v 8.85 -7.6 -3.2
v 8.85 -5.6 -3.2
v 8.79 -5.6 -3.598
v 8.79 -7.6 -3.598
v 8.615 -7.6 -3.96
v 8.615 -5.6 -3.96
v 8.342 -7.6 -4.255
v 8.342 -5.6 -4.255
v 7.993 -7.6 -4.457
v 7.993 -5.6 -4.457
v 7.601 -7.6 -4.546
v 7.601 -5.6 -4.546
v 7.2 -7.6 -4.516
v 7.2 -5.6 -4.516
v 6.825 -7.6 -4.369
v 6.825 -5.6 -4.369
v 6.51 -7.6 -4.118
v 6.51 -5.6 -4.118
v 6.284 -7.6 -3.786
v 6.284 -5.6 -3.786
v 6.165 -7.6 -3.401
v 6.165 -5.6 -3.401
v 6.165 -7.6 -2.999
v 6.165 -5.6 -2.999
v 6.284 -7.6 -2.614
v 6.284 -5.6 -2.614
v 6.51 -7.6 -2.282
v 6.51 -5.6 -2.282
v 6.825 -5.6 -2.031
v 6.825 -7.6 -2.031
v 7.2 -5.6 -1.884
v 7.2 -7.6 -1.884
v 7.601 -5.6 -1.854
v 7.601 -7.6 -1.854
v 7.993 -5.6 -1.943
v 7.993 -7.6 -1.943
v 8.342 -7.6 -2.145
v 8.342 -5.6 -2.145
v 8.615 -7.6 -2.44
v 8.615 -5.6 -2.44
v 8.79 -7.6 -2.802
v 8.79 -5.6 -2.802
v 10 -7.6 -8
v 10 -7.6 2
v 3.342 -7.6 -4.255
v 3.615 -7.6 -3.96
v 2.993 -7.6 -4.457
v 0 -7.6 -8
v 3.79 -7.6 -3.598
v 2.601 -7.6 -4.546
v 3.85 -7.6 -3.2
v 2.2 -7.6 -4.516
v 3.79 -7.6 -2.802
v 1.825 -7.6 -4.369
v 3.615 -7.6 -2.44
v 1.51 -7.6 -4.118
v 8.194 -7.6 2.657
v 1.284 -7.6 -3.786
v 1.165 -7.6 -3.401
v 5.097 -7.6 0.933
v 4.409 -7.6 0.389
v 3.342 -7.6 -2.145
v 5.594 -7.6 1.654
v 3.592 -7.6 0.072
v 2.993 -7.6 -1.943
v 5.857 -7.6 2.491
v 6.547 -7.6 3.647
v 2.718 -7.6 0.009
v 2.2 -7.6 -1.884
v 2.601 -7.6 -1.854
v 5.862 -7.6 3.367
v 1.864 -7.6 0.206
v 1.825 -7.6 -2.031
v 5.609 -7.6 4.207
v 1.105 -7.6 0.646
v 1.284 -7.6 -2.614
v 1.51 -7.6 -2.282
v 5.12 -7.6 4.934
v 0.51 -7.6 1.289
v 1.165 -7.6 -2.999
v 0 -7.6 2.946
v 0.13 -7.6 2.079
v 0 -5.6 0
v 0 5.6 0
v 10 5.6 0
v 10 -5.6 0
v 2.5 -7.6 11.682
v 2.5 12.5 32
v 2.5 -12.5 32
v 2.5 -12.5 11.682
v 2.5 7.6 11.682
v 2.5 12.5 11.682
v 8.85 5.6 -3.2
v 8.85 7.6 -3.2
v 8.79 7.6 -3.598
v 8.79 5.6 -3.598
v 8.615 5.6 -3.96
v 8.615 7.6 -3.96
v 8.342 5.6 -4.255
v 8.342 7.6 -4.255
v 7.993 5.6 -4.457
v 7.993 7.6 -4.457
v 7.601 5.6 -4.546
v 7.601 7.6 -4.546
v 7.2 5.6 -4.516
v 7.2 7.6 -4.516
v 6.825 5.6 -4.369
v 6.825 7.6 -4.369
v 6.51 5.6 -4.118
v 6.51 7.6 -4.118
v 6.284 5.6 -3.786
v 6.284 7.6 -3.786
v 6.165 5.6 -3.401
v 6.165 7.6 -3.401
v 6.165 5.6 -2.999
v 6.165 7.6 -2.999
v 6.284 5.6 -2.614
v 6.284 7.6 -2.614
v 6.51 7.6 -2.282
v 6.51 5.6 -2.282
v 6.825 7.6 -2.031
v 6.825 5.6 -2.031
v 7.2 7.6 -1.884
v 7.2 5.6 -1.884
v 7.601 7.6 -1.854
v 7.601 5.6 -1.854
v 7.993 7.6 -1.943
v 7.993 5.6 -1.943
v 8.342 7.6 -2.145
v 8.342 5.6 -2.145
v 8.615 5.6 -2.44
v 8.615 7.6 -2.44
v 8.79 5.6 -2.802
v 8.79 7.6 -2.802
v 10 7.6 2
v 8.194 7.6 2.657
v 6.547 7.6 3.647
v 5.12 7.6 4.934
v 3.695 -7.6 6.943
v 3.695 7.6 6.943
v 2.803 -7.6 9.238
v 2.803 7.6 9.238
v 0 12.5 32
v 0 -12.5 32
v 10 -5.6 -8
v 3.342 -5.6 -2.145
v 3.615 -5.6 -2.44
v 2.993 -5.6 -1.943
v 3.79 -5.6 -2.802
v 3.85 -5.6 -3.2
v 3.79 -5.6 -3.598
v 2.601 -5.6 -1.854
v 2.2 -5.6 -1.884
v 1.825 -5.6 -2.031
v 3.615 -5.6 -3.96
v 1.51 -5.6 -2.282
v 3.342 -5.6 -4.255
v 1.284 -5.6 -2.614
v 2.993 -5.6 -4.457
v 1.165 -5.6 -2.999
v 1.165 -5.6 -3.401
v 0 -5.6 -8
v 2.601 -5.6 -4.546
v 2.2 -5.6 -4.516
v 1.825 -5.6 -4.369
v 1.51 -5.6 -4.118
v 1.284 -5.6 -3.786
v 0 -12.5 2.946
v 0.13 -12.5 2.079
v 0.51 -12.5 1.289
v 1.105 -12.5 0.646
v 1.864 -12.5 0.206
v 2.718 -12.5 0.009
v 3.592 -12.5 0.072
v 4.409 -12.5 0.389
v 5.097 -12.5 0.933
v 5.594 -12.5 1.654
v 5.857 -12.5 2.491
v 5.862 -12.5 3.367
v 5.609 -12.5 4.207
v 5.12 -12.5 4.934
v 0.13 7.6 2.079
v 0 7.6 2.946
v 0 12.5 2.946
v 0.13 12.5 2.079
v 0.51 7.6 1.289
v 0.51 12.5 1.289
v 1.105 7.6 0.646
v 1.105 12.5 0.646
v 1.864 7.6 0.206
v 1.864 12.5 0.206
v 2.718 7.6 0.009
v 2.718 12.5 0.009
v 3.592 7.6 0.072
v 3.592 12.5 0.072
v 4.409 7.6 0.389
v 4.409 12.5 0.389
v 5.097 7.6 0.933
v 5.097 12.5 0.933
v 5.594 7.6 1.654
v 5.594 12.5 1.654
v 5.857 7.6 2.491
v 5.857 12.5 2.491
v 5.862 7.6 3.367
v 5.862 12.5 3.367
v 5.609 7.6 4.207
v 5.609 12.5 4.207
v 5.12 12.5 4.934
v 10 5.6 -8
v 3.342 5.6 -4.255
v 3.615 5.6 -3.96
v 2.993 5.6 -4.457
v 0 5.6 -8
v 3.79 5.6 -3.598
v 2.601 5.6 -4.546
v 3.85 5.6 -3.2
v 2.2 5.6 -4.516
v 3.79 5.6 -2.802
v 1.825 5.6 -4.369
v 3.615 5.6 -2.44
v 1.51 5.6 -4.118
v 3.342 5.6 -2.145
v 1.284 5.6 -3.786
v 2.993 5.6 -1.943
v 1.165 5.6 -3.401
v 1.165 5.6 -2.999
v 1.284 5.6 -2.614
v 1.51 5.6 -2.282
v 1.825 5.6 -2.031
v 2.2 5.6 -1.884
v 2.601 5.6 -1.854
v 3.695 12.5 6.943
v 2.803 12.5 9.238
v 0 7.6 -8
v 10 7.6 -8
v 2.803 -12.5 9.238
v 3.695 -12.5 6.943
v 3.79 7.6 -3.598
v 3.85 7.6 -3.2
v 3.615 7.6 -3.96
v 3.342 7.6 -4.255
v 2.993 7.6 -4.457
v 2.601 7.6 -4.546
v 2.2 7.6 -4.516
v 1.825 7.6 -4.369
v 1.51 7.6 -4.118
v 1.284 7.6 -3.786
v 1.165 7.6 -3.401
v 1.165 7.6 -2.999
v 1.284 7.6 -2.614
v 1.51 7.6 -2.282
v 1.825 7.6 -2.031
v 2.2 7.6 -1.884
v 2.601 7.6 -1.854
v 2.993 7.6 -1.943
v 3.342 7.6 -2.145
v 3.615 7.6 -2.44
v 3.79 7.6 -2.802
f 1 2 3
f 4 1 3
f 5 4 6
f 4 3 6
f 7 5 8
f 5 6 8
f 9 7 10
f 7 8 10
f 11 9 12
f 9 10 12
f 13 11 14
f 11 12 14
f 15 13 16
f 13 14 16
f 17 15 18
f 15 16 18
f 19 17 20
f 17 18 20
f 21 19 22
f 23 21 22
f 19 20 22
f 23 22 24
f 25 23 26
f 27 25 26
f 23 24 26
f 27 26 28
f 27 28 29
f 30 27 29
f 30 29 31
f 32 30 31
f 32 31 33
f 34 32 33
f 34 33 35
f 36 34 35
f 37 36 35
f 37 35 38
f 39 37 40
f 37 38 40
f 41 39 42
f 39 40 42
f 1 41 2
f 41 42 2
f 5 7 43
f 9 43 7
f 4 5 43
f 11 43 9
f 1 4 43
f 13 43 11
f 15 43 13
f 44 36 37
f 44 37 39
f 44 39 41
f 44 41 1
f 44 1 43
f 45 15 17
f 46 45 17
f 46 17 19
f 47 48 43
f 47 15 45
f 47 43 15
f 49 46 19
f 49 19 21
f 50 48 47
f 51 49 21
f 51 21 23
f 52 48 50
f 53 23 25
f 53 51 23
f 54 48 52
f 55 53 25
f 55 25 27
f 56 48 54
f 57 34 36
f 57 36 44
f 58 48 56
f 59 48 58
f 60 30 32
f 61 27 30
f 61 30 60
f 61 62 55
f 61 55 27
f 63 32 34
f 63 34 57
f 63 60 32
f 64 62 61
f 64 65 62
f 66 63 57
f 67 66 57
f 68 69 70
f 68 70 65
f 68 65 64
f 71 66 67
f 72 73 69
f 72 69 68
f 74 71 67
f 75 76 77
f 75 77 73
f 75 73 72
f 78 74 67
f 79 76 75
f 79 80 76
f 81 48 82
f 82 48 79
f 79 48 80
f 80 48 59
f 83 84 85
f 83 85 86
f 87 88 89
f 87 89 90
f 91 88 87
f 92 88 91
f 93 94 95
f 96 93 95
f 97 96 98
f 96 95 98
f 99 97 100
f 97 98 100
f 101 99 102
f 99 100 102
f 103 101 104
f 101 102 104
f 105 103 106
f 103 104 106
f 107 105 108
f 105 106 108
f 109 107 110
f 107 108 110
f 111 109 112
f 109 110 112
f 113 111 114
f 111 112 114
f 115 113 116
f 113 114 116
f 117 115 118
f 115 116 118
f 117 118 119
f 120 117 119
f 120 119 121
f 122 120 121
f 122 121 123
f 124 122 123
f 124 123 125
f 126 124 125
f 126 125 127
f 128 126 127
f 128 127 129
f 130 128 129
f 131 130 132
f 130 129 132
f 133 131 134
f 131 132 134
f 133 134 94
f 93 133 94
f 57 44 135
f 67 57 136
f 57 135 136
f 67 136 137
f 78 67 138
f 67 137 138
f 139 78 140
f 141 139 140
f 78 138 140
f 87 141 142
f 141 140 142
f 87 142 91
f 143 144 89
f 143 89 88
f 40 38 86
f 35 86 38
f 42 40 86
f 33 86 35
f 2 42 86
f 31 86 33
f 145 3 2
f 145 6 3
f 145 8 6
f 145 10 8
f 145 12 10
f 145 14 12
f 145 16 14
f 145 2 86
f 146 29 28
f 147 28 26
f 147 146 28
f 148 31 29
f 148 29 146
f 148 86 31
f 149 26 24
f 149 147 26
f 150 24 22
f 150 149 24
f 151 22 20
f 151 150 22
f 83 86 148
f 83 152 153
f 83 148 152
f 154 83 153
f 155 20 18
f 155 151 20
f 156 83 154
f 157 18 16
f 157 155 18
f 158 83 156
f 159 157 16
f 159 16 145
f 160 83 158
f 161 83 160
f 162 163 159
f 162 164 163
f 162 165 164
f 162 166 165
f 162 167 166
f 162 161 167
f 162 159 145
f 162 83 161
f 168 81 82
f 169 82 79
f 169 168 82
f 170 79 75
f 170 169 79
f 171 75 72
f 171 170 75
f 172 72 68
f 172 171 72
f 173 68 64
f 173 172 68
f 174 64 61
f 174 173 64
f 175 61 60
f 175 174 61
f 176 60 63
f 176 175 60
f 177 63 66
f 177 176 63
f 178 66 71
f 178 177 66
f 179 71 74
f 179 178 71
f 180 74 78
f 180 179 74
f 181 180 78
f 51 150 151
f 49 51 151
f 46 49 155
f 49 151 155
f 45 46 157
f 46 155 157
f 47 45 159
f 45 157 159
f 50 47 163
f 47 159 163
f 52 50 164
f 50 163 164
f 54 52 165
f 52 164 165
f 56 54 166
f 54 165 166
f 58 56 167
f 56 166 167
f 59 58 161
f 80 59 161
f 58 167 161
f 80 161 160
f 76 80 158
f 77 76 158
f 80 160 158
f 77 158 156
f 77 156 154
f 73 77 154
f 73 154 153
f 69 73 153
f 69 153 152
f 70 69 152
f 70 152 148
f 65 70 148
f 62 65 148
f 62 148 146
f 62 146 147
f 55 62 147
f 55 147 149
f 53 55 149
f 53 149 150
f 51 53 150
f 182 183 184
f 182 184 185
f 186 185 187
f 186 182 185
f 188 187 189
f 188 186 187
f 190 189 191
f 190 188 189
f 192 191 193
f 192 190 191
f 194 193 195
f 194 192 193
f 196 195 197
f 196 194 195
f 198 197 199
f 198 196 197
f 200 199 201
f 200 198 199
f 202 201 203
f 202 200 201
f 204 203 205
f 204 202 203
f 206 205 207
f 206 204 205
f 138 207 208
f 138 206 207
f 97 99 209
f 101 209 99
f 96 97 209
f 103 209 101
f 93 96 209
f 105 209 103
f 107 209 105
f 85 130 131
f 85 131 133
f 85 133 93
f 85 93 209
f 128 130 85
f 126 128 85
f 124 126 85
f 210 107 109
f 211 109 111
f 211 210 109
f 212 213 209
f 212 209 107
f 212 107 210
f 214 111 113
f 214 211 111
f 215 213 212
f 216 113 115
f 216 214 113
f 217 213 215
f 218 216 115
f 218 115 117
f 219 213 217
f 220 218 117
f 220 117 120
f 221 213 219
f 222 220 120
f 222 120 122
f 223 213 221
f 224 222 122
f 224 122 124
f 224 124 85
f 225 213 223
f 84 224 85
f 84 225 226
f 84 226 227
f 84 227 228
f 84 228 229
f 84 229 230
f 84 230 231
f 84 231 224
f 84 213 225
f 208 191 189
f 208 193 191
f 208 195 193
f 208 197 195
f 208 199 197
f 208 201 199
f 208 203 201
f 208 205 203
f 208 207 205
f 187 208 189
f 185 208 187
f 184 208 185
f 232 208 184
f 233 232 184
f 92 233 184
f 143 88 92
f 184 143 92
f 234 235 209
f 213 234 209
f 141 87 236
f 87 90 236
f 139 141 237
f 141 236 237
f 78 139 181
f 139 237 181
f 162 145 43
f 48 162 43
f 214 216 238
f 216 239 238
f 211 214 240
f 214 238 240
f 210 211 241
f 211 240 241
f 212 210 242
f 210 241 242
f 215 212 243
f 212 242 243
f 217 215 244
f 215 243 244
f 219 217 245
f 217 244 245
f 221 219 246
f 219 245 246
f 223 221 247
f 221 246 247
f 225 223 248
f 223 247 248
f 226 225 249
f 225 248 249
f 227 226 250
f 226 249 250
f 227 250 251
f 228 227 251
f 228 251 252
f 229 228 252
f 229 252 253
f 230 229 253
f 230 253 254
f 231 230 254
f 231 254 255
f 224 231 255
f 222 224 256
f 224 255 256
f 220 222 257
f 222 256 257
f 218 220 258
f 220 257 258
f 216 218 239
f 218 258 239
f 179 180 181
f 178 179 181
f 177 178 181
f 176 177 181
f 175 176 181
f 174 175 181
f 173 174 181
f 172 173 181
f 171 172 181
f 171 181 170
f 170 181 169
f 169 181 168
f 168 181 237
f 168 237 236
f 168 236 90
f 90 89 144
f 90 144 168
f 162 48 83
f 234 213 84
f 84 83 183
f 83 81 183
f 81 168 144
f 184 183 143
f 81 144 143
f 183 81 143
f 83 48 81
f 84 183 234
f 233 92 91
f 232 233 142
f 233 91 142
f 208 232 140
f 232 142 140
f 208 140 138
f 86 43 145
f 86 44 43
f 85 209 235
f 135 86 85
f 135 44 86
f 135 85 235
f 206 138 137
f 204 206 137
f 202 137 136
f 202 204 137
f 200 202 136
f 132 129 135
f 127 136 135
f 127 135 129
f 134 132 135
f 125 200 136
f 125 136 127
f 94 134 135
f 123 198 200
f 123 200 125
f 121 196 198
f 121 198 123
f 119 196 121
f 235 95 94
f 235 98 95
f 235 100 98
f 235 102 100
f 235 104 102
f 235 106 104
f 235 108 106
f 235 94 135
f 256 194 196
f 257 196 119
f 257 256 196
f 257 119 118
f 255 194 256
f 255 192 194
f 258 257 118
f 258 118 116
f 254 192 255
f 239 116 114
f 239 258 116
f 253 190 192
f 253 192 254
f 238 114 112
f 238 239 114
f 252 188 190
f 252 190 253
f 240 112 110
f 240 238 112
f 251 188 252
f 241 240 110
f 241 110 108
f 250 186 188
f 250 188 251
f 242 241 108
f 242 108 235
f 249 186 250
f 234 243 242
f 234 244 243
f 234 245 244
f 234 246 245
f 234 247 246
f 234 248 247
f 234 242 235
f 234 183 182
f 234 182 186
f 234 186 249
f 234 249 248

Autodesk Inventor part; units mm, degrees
ref_plane "YZ Plane" through (0, 0, 0) normal (1, 0, 0) x (0, 1, 0)
ref_plane "XZ Plane" through (0, 0, 0) normal (0, 1, 0) x (-1, 0, 0)
ref_plane "XY Plane" through (0, 0, 0) normal (0, 0, 1) x (1, 0, 0)
sketch "スケッチ1" plane through (0, 0, 0) normal (1, 0, 0) x (0, 1, 0)
  line L0 (5.6, 0) -> (-5.6, 0)
  line L1 (-5.6, 0) -> (-5.6, -8)
  line L2 (-5.6, -8) -> (5.6, -8)
  line L3 (5.6, -8) -> (5.6, 0)
  line L4 (7.6, -8) -> (-7.6, -8)
  line L5 (-7.6, -8) -> (-7.6, 32)
  line L6 (-7.6, 32) -> (7.6, 32)
  line L7 (7.6, 32) -> (7.6, -8)
  point P0 (0, 0)
  point P1 (0, -8)
  dimension "d0" = 11.2
  dimension "d1" = 8
  dimension "d2" = 15.2
  dimension "d3" = 40
extrude "押し出し1" add sketch "スケッチ1" along normal blind 10 contours L0 L1 L4 L5 L6 L7 L3
sketch "スケッチ2" plane through (0, 7.6, 32) normal (0, 1, 0) x (1, 0, 0)
  circle A0 centre (2.5, 35.2) radius 1.35
  circle A1 centre (7.5, 35.2) radius 1.35
  line L0 (0, 40) -> (0, 0) projected
  line L1 (10, 40) -> (10, 0) projected
  line L2 (0, 32) -> (10, 32) projected
  dimension "d6" = 2.7
  dimension "d7" = 2.7
  dimension "d8" = 2.5
  dimension "d9" = 2.5
  dimension "d10" = 3.2
extrude "押し出し2" cut sketch "スケッチ2" against normal through all
sketch "スケッチ3" plane through (0, 7.6, 32) normal (0, 1, 0) x (1, 0, 0)
  line L0 (10, 0) -> (2.5, 0)
  line L1 (2.5, 0) -> (2.5, 30)
  line L2 (2.5, 30) -> (10, 30)
  line L3 (10, 30) -> (10, 0)
  line L4 (0, 40) -> (0, 0) projected
  point P0 (0, 32)
  dimension "d13" = 2.5
  dimension "d14" = 30
extrude "押し出し3" cut sketch "スケッチ3" against normal through all
fillet "フィレット1" radius 10 1 edges at (2.5, 0, 2)
sketch "スケッチ4" plane through (0, 0, 0) normal (0, 1, 0) x (-1, 0, 0)
  line L0 (0, -8) -> (-10, -8) projected
  line L1 (0, -8) -> (0, 32) projected
  line L2 (0, 32) -> (-2.5, 32) projected
  line L3 (-2.5, 32) -> (-2.5, 11.6825) projected
  circle A0 centre (-2.5, -3.2) radius 1.35 projected
  circle A1 centre (-2.9461, 2.9461) radius 2.9461
  line L4 (0, 0) -> (-10, 0) projected
  line L5 (-10, -8) -> (-10, 2) projected
  arc A2 (-10, 2) -> (-2.5, 11.6825) centre (-12.5, 11.6825) ccw projected
  point P0 (0, 2.9461)
  point P1 (-2.5, 5.8582)
  point P2 (-2.5, 0.034)
  point P3 (-5.1202, 4.9342)
extrude "押し出し4" add sketch "スケッチ4" along normal mid plane 25 contours A1 A2 L3 L2 L1 | A1
properties part number "hand_finger"
